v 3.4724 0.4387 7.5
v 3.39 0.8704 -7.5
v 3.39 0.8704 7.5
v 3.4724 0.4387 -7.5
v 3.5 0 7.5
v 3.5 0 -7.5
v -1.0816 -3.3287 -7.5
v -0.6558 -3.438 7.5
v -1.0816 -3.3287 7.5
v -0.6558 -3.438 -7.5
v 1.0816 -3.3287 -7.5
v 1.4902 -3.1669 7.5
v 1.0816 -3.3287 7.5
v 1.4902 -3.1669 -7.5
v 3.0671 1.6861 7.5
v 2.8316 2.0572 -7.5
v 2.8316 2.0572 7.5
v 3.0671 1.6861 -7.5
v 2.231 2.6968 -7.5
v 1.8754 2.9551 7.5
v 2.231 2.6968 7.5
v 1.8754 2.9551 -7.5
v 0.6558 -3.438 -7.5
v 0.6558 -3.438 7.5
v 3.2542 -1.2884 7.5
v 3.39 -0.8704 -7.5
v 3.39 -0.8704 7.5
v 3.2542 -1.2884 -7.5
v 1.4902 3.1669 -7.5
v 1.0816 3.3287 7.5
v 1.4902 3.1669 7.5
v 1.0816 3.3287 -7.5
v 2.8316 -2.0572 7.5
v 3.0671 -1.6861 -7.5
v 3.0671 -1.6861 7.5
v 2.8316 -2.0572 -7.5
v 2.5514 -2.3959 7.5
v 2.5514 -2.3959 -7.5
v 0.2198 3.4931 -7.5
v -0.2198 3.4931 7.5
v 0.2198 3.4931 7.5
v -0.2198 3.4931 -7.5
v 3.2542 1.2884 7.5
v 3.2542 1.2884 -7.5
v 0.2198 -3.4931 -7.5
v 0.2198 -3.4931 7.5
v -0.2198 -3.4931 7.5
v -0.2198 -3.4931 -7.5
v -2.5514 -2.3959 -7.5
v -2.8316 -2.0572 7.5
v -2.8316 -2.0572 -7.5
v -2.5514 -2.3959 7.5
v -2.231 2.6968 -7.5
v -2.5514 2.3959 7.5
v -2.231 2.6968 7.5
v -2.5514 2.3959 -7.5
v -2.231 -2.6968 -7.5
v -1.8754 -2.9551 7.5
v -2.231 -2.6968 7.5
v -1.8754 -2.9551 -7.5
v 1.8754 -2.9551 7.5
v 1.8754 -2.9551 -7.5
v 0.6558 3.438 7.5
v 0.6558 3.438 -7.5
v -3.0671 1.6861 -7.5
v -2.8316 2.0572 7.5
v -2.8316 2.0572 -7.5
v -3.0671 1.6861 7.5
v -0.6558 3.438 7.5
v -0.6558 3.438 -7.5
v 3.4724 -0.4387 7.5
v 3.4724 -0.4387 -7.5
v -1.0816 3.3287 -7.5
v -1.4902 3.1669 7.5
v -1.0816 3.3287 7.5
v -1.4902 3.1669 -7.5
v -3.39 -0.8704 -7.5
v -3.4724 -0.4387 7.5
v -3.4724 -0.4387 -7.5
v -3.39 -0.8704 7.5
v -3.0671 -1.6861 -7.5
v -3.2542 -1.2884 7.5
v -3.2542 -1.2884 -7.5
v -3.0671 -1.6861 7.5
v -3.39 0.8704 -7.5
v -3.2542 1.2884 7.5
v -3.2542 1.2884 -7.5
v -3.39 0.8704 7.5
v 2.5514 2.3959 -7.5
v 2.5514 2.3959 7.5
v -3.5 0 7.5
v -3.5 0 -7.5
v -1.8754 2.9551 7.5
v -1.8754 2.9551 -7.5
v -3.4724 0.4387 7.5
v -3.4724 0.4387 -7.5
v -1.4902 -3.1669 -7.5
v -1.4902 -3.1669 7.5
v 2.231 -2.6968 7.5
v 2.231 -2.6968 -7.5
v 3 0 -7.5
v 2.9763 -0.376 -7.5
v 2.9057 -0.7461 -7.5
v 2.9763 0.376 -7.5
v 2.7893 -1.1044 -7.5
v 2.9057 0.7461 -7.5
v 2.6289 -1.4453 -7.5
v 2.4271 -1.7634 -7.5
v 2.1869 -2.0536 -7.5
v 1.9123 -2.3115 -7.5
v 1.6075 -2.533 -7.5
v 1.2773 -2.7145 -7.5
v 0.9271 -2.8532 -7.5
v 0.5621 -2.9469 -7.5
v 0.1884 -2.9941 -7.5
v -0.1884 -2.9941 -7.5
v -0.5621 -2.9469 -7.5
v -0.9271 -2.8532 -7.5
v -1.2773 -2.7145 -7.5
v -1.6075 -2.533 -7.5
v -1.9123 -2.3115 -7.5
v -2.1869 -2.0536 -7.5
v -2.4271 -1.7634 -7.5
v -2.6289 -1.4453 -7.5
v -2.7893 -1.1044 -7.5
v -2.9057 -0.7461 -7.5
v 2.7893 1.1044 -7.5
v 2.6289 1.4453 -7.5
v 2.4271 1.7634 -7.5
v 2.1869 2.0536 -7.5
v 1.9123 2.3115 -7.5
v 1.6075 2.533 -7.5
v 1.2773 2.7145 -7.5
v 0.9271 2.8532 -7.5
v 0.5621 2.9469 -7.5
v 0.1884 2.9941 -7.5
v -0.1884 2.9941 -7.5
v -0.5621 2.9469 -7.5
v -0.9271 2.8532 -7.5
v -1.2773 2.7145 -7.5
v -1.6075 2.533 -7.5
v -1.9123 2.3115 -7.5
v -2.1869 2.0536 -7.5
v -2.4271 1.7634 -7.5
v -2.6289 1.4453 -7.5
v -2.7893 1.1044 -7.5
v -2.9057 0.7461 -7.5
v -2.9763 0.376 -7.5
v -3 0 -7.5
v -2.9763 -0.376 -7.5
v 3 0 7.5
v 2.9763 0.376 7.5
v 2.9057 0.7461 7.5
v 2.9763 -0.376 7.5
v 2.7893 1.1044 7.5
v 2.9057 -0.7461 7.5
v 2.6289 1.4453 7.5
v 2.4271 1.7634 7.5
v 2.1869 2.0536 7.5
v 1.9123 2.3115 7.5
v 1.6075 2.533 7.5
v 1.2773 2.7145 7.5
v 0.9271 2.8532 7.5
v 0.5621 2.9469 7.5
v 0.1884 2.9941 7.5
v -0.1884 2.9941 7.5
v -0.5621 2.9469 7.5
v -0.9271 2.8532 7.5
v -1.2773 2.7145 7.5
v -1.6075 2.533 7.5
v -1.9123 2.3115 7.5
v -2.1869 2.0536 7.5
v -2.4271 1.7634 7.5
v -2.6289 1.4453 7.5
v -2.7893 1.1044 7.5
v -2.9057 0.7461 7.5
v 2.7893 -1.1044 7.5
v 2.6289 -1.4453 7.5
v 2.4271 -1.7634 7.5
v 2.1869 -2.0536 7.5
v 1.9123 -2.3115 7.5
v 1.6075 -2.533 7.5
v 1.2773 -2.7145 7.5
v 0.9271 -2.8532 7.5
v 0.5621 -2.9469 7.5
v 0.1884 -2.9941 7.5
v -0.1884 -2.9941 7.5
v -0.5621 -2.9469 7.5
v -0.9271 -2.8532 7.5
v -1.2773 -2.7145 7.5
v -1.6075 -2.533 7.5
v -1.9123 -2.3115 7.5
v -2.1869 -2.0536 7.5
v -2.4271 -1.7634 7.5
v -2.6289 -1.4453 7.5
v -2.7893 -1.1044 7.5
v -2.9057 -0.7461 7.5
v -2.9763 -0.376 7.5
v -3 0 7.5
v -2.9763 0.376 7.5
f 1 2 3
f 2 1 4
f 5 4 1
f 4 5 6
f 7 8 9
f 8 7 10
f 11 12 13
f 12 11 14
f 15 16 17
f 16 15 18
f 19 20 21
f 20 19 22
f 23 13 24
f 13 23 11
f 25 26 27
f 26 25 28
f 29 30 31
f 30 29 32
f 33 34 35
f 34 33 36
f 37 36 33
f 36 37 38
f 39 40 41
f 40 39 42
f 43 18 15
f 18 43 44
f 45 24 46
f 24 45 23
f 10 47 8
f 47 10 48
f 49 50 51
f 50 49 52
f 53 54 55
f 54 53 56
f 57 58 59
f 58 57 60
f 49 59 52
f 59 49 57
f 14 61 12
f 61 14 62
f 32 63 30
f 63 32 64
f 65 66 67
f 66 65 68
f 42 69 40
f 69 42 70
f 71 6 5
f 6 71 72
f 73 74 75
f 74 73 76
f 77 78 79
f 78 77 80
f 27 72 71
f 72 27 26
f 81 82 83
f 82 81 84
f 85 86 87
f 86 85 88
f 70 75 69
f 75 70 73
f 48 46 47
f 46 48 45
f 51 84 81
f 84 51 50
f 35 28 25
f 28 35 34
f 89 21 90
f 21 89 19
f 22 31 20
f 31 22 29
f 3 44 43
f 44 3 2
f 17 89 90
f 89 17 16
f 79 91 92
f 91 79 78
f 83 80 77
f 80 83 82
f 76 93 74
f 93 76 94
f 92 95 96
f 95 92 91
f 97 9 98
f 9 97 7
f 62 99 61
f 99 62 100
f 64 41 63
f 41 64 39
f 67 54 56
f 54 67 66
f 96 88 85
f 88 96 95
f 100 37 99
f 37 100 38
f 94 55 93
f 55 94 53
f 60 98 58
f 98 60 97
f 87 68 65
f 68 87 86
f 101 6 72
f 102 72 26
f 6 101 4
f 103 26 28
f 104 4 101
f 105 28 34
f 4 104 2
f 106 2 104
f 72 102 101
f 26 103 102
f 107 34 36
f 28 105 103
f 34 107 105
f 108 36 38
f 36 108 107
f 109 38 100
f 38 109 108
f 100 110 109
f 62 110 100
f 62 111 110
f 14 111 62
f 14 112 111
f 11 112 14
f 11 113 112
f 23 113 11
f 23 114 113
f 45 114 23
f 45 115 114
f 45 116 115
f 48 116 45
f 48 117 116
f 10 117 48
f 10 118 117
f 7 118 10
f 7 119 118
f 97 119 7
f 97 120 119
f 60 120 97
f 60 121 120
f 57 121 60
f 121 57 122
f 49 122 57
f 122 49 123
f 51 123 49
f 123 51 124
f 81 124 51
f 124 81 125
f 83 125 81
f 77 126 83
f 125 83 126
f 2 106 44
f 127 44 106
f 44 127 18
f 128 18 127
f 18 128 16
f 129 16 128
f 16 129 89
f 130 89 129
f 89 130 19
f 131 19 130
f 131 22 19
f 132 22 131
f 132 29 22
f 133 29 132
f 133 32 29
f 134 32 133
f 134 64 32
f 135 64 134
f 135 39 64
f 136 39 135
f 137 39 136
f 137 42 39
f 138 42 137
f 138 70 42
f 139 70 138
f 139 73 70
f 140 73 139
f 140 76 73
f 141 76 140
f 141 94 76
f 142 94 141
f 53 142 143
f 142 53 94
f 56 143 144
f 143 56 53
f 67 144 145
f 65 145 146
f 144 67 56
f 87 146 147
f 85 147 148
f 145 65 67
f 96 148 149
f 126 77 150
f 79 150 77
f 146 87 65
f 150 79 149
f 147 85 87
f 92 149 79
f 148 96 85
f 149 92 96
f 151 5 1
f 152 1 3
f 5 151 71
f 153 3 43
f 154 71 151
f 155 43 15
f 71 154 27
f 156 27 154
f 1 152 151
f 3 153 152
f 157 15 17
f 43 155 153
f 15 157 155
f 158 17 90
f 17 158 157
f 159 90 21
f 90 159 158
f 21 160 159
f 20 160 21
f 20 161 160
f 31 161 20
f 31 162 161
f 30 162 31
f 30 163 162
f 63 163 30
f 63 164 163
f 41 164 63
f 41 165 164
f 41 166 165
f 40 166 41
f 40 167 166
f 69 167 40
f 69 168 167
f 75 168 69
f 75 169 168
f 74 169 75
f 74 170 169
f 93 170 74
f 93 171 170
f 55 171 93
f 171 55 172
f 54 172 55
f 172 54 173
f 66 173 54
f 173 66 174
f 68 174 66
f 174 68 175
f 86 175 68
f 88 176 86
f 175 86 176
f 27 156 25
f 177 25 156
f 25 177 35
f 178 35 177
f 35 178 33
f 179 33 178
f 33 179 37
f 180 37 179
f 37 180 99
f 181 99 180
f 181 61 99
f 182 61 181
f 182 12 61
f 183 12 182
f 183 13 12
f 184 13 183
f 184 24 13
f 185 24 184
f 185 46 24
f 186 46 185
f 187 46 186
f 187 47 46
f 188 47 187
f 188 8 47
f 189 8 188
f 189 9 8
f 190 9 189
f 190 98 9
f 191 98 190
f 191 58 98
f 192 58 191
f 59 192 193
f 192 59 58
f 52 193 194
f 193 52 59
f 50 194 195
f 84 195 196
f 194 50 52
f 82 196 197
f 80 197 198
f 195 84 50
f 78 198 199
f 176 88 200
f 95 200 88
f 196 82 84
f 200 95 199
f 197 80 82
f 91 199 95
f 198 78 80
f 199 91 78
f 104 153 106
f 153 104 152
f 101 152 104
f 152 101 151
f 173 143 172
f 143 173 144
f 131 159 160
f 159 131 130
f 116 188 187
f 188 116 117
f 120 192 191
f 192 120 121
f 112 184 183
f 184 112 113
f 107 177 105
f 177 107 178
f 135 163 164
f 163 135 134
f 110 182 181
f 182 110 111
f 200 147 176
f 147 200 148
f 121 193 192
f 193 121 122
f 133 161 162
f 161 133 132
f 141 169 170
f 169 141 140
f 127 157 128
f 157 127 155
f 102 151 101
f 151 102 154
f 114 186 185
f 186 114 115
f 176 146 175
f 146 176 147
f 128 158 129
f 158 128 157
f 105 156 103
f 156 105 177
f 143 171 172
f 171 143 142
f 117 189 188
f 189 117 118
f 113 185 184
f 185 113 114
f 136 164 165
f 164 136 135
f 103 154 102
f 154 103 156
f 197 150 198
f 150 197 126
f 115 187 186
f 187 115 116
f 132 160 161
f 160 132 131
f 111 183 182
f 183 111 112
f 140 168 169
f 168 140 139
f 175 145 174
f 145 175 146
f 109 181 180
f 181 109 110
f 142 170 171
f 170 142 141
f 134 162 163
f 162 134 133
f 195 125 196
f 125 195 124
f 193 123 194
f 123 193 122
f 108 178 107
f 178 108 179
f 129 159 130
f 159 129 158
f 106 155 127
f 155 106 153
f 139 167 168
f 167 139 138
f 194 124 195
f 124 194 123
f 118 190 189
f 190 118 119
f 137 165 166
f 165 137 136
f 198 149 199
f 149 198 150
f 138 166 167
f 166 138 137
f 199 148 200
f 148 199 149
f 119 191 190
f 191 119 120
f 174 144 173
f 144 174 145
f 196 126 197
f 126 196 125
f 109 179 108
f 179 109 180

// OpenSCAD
$fn = 50;


difference() {
	union() {
		translate(v = [0, 0, -7.5000000000]) {
			cylinder(h = 15, r = 3.5000000000);
		}
	}
	union() {
		translate(v = [0, 0, -100.0000000000]) {
			cylinder(h = 200, r = 3.0000000000);
		}
	}
}
